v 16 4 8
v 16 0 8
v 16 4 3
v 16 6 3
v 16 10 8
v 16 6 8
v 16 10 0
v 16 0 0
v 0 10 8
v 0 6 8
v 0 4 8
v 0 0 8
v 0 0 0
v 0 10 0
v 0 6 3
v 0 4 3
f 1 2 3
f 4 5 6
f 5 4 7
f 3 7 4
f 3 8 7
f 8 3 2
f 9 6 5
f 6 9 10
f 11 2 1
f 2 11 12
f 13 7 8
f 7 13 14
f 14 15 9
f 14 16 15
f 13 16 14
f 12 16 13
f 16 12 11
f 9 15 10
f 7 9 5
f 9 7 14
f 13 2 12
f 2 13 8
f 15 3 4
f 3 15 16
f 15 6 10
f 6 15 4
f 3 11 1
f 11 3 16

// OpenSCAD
$fn = 32;

// ----------------------------------------------------------------------
// Micro clip: slotted block, 5-20 mm class
// ----------------------------------------------------------------------

// --- parameters (mm) ---
block_l = 16;             // block length, X
block_w = 10;             // block width, Y
block_h = 8;              // block height, Z
slot_w = 2;               // slot width
slot_d = 5;               // slot depth from the top

difference() {
  cube([block_l, block_w, block_h]);
  translate([-1, block_w / 2 - slot_w / 2, block_h - slot_d])
    cube([block_l + 2, slot_w, slot_d + 1]);
}
